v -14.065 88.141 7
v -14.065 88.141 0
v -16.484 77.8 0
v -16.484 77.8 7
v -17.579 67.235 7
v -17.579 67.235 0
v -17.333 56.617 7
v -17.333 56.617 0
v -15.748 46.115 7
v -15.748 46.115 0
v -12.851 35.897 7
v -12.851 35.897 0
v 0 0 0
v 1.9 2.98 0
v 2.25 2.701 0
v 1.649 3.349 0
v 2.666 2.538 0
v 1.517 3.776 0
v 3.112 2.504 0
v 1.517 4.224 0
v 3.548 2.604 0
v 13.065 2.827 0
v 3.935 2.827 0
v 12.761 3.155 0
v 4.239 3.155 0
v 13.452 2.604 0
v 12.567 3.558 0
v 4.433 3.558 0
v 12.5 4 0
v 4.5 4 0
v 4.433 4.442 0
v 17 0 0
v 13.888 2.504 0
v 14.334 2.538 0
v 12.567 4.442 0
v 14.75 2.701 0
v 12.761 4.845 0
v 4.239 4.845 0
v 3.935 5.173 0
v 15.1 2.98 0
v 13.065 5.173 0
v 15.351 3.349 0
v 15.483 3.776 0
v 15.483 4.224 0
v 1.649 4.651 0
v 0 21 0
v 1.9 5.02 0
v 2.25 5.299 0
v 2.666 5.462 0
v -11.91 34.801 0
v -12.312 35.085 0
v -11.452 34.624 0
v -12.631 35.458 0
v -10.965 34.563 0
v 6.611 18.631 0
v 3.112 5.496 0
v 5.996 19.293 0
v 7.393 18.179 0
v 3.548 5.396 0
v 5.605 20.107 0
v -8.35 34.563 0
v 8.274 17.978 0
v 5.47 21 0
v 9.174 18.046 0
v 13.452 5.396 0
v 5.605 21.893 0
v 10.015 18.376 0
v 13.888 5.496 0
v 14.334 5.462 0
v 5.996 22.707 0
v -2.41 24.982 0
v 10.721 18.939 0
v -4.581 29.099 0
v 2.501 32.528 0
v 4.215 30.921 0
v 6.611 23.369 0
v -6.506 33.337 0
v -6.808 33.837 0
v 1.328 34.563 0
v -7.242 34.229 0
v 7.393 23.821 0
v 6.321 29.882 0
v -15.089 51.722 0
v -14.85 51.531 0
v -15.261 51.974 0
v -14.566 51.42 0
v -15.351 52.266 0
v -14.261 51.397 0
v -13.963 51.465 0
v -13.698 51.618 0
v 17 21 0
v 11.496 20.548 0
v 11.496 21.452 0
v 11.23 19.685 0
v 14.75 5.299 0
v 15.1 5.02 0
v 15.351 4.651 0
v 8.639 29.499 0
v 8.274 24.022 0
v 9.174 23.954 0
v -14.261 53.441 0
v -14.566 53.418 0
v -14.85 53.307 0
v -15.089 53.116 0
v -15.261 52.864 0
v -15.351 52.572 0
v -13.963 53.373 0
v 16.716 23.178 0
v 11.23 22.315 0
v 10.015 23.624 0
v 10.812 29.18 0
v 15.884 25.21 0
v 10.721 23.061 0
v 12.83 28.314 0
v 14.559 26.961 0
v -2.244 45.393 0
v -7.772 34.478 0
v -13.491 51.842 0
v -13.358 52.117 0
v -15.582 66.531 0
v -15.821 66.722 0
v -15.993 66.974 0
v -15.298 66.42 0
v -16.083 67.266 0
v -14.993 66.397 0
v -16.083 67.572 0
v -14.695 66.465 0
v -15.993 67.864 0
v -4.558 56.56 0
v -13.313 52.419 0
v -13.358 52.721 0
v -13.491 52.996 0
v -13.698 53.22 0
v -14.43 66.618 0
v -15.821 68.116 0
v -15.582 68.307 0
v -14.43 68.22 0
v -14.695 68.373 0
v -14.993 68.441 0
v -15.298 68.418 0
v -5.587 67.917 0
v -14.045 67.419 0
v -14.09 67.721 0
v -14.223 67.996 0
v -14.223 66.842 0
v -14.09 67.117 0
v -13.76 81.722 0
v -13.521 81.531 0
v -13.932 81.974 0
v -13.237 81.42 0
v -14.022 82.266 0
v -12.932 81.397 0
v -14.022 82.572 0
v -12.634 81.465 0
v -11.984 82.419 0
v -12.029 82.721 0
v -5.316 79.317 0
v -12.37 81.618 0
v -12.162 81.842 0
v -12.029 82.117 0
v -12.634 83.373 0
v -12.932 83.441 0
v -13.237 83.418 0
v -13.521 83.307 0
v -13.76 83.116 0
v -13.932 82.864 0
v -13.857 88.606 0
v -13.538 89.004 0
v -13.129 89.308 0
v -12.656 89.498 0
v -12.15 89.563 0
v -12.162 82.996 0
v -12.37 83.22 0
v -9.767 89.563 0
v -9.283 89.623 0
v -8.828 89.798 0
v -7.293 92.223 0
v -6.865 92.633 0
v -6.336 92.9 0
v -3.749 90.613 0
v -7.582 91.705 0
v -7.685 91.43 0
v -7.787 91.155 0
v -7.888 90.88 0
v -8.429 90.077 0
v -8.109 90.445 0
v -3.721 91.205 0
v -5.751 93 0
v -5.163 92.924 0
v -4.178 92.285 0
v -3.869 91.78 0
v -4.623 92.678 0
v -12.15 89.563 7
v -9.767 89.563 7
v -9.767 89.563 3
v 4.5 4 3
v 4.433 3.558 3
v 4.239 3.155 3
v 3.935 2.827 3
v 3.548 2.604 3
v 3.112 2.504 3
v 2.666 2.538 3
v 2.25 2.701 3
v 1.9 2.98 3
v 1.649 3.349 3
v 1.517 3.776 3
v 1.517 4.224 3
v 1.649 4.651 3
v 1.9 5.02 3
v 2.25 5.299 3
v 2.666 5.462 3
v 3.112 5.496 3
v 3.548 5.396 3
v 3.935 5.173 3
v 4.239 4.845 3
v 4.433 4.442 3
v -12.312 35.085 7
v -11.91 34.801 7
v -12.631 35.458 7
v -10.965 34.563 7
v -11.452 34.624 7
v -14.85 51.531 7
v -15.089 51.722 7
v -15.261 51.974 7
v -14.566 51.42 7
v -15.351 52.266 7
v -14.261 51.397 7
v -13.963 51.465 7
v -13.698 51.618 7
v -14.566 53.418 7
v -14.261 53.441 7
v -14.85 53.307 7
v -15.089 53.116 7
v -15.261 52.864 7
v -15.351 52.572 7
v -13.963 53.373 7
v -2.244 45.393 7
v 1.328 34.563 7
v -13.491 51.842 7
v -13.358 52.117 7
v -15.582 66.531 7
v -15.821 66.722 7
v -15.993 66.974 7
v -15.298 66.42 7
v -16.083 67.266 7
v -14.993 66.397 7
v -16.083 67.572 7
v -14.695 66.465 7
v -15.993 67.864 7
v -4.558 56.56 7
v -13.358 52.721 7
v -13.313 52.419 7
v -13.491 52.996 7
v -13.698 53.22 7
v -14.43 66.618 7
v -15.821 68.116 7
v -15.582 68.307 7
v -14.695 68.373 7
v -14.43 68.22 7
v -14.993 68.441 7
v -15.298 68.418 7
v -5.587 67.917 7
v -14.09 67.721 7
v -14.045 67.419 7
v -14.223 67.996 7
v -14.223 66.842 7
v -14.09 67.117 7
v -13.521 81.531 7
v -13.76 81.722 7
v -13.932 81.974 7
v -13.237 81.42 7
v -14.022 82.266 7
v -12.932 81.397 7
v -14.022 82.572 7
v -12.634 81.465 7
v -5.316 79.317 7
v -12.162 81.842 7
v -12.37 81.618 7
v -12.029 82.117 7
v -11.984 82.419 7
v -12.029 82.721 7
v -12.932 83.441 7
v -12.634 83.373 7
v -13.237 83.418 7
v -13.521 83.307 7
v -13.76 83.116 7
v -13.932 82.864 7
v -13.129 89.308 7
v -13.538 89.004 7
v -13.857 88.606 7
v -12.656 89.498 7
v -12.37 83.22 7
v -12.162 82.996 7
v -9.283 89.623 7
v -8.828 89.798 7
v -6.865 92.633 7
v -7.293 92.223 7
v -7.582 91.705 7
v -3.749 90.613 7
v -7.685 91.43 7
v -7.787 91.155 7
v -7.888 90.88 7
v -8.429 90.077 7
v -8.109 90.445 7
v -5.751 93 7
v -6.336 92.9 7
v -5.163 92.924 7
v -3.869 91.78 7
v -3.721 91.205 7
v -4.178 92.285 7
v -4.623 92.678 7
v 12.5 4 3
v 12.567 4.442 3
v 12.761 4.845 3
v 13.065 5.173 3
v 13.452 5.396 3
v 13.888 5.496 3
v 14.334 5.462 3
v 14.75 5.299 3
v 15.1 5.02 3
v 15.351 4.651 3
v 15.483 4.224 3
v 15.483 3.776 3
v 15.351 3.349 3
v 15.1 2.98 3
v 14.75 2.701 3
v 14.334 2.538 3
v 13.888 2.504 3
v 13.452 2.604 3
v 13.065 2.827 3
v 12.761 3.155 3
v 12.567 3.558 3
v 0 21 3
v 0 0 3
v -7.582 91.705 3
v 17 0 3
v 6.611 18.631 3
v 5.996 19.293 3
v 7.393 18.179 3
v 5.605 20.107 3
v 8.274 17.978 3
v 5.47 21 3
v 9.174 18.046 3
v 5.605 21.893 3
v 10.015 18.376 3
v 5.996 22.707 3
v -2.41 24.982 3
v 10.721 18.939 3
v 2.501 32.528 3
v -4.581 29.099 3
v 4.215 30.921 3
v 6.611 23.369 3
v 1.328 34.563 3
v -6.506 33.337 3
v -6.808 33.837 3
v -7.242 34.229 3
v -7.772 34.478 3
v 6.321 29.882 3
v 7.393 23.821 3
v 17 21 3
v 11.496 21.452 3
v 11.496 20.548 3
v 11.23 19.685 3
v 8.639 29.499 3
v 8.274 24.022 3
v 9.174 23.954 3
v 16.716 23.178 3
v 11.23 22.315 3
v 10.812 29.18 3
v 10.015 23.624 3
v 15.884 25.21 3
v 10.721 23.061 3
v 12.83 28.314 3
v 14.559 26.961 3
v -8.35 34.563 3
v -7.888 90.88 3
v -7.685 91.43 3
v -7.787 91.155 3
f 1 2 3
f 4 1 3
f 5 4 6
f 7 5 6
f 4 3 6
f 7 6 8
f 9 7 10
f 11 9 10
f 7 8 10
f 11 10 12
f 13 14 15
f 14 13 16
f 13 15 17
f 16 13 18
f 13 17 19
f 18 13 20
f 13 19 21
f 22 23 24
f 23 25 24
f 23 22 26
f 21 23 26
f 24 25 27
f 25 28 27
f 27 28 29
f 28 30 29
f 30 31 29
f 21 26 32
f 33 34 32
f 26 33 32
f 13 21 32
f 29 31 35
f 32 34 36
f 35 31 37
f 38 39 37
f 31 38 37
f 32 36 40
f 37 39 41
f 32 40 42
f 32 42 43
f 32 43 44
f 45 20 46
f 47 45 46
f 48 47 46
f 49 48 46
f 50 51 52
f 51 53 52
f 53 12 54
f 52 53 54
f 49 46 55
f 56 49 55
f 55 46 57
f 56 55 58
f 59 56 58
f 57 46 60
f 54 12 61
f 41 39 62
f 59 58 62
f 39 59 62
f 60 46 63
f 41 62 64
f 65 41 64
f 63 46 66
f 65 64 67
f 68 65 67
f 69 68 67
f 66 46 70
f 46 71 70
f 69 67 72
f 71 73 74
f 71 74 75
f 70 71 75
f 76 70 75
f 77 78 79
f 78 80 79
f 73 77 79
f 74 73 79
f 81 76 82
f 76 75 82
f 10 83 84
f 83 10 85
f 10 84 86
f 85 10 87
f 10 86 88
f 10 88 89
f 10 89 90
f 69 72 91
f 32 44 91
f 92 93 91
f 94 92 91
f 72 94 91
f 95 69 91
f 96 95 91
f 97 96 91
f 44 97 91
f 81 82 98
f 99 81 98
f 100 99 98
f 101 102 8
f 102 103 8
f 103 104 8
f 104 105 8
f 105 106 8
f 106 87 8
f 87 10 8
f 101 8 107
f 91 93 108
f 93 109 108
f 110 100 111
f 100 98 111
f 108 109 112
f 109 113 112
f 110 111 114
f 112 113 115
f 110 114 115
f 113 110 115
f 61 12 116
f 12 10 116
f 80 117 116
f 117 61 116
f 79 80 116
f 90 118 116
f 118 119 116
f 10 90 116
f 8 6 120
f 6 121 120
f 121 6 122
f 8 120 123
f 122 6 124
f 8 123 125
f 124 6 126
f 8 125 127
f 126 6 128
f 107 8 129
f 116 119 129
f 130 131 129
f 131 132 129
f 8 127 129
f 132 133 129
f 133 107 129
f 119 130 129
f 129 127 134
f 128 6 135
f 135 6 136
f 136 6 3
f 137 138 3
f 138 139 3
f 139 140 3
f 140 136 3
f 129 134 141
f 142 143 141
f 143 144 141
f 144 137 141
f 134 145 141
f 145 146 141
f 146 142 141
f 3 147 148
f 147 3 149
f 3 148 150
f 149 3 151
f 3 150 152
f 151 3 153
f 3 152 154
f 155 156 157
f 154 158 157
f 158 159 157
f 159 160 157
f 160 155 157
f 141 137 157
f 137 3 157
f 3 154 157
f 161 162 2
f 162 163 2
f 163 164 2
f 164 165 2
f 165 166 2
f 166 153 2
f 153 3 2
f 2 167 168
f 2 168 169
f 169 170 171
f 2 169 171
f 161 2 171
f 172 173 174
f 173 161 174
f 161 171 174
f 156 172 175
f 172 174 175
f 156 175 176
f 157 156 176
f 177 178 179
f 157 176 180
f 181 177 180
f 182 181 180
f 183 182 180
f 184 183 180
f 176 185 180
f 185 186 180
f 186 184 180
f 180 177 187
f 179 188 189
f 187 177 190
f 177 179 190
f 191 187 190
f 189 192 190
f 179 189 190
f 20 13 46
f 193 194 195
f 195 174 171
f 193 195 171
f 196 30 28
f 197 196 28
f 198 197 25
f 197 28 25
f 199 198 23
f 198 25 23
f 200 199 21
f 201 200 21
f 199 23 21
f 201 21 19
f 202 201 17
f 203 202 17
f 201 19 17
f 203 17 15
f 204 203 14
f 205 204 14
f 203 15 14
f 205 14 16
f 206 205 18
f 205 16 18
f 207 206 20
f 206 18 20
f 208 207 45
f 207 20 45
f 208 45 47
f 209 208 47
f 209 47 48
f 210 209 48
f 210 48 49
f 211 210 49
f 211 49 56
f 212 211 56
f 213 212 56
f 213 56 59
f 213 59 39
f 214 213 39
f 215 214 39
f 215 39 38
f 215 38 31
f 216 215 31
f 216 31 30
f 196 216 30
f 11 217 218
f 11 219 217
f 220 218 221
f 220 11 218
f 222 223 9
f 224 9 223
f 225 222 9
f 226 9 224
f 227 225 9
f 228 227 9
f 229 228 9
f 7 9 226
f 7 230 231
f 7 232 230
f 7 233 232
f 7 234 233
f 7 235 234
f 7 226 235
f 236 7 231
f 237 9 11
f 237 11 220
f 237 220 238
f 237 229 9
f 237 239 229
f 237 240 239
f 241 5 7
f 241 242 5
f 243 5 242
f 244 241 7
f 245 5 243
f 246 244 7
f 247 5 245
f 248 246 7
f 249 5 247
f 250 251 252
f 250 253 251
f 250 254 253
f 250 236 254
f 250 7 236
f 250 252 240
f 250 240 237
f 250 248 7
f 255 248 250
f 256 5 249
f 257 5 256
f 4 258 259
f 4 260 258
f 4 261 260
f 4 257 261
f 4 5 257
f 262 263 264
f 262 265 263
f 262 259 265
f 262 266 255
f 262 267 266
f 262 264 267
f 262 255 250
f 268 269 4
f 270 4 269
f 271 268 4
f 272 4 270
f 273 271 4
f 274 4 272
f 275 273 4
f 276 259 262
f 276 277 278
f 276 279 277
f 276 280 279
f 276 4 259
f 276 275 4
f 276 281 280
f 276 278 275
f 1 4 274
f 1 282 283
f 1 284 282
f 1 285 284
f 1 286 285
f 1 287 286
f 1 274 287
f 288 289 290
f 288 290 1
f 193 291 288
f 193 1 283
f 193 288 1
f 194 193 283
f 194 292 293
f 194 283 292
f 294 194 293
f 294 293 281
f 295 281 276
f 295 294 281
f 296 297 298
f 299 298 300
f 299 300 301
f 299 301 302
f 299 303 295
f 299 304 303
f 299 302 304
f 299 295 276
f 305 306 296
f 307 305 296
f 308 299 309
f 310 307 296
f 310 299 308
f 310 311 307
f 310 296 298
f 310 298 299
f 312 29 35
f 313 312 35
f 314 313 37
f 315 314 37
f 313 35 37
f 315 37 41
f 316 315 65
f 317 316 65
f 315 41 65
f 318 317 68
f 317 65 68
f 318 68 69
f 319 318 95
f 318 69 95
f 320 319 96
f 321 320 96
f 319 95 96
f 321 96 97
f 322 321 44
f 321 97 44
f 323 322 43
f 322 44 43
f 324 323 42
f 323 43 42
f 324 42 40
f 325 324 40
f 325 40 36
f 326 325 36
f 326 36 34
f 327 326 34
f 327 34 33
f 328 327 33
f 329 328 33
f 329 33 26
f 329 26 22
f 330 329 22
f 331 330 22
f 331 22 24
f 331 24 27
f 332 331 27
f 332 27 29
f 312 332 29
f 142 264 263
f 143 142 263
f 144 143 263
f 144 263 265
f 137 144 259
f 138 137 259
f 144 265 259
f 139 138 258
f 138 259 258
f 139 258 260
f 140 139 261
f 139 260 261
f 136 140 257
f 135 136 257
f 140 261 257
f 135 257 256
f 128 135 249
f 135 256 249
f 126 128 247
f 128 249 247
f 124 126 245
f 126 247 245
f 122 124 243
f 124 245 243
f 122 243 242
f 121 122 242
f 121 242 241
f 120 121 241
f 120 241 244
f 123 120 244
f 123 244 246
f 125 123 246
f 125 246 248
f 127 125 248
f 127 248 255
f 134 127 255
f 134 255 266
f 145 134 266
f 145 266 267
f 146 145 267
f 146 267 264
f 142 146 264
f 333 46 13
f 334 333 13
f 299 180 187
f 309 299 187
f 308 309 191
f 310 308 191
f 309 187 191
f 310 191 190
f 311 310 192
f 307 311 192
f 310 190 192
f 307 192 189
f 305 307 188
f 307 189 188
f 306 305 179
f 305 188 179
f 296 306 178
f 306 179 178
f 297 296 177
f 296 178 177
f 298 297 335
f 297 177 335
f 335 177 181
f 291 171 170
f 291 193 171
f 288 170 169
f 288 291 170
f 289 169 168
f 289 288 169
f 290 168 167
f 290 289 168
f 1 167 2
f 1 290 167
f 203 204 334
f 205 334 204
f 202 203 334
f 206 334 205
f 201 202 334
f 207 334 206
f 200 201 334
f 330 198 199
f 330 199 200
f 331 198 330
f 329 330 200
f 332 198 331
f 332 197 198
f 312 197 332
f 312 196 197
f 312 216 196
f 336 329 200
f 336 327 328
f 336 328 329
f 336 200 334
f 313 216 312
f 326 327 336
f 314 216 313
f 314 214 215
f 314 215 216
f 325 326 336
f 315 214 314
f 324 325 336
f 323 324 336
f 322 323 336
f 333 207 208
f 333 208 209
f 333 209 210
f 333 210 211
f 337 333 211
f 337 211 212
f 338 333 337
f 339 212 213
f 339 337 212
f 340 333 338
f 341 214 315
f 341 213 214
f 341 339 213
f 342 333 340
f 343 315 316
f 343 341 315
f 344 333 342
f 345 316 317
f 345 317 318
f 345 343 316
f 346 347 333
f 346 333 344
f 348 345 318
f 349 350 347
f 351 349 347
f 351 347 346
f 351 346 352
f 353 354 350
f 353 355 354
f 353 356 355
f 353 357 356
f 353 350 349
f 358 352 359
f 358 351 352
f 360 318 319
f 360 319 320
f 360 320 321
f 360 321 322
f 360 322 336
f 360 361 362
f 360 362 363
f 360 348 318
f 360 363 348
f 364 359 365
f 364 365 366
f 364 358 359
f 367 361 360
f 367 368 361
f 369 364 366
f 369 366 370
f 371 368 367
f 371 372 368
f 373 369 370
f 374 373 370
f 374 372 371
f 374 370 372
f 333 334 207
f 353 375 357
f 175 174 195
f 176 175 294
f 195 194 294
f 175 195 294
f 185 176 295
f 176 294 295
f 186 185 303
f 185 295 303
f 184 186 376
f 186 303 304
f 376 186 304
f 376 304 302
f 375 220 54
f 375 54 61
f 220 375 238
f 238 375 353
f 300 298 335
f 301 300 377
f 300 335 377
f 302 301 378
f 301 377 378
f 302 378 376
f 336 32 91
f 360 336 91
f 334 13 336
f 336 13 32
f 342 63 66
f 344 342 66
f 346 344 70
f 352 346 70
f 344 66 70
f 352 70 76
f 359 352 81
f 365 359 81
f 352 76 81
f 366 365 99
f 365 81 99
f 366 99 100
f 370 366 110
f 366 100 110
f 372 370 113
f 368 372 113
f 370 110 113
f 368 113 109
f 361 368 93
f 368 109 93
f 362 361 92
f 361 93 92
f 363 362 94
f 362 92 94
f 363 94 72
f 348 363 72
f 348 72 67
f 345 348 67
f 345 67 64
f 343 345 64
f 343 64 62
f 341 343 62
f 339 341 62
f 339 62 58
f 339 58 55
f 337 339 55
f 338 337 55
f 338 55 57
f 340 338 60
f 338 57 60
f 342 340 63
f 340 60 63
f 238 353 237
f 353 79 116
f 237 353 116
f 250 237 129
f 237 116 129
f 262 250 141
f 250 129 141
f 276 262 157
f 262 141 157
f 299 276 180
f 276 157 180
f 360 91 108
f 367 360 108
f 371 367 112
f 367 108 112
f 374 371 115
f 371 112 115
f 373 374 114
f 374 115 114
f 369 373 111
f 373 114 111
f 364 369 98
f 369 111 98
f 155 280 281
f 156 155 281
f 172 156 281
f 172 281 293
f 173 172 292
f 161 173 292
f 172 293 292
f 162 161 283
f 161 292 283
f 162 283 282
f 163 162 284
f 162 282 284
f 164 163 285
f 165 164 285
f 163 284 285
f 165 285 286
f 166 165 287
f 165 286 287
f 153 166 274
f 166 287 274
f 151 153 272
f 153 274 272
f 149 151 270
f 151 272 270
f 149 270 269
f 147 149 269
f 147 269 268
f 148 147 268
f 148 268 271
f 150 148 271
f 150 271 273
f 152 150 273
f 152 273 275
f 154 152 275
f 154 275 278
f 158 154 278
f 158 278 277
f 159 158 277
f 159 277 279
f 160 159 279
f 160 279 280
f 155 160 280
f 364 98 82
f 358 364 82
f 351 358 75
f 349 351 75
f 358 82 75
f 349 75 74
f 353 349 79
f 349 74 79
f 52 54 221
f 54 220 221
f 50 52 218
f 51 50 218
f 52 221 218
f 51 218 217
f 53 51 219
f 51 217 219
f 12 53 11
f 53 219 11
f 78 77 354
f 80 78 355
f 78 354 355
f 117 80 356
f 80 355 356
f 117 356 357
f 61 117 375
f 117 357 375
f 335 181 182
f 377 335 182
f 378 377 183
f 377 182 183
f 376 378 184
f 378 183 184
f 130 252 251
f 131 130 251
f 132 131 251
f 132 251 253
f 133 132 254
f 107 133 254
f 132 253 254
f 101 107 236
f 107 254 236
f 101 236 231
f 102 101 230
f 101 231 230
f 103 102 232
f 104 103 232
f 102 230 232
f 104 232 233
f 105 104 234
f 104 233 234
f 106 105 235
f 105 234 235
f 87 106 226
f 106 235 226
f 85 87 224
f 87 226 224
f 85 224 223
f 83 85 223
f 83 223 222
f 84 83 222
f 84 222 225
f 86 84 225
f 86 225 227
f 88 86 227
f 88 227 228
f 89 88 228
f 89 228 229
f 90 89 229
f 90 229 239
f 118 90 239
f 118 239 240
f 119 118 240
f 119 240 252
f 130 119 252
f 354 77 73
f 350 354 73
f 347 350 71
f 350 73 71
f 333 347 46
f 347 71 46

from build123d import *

# Parameters (mm, degrees)
SKETCH_1_R           = 3.5
EXTRUDE_1_DEPTH      = 3
SKETCH_2_R           = 1.5
CUT_EXTRUDE_1_DEPTH  = 10
EXTRUDE_2_DEPTH      = 4
EXTRUDE_5_DEPTH      = 7
FILLET_1_R           = 2
HOLE_WIZARD_M2_5_1_D = 2.05
SKETCH_12_R          = 4.953561737
SKETCH_12_R_2        = 3.03
EXTRUDE_6_DEPTH      = 3


with BuildPart() as part:
    # 草图1 → 凸台-拉伸1 (new body)
    with BuildSketch(Plane.XY):
        with BuildLine():
            Line((0, 0), (17, 0))
            Line((17, 0), (17, 21))
            ThreePointArc((17, 21), (14.559389791, 26.961023013), (8.639106973, 29.498861644))
            ThreePointArc((8.639106973, 29.498861644), (4.214678609, 30.921411086), (1.327625741, 34.563407653))
            ThreePointArc((1.327625741, 34.563407653), (-5.234705957, 62.223549547), (-3.748501306, 90.612611571))
            ThreePointArc((-3.748501306, 90.612611571), (-5.162788524, 92.923505905), (-7.58241645, 91.704554856))
            ThreePointArc((-7.58241645, 91.704554856), (-12.196269834, 55.45091149), (0, 21))
            Line((0, 21), (0, 0))
        make_face()
        with Locations((8.5, 21)):
            Circle(SKETCH_1_R, mode=Mode.SUBTRACT)
    extrude(amount=EXTRUDE_1_DEPTH)

    # 草图2 → 切除-拉伸1 (cut)
    with BuildSketch(Plane(origin=(0, 0, 0), x_dir=(-1, 0, 0), z_dir=(0, 0, -1))):
        with Locations((-14, 4)):
            Circle(SKETCH_2_R)
        with Locations(Location((-3, 4, 0), (0, 0, 180))):
            Circle(SKETCH_2_R)
    extrude(amount=-CUT_EXTRUDE_1_DEPTH, mode=Mode.SUBTRACT)

    # 草图3 → 凸台-拉伸2 (add)
    with BuildSketch(Plane.XY.offset(3)):
        with BuildLine():
            ThreePointArc((-7.58241645, 91.704554856), (-12.6426678, 63.080202535), (-7.007767698, 34.563407653))
            Line((-7.007767698, 34.563407653), (1.327625741, 34.563407653))
            ThreePointArc((1.327625741, 34.563407653), (-5.234705957, 62.223549547), (-3.748501306, 90.612611571))
            ThreePointArc((-3.748501306, 90.612611571), (-5.162788524, 92.923505905), (-7.58241645, 91.704554856))
        make_face()
    extrude(amount=EXTRUDE_2_DEPTH)

    # 草图8 → 凸台-拉伸5 (add)
    with BuildSketch(Plane(origin=(0, 0, 0), x_dir=(-1, 0, 0), z_dir=(0, 0, -1))):
        with BuildLine():
            Line((8.353336216, 89.563407653), (13.622203114, 89.563407653))
            ThreePointArc((13.622203114, 89.563407653), (17.624786926, 61.957713987), (12.366747323, 34.563407653))
            Line((12.366747323, 34.563407653), (7.007767698, 34.563407653))
            ThreePointArc((7.007767698, 34.563407653), (12.623031035, 61.942490485), (8.353336216, 89.563407653))
        make_face()
    extrude(amount=-EXTRUDE_5_DEPTH)

    # 圆角1
    fillet_1_edges = [part.edges().sort_by_distance(p)[0] for p in [
        (-12.366747323, 34.563407653, 3.5),
        (-13.622203114, 89.563407653, 3.5),
        (-8.353336216, 89.563407653, 3.5),
        (-7.007767698, 34.563407653, 1.5),
    ]]
    fillet(fillet_1_edges, radius=FILLET_1_R)

    # M2.5 螺纹孔1 (through all)
    with Locations(Plane(origin=(0, 0, 0), x_dir=(-1, 0, 0), z_dir=(0, 0, -1))):
        with Locations((14.33753876, 52.418963936), (-20.3596947, 65.689324708), (13.008857265, 82.418963936), (15.069556912, 67.418963936)):
            Hole(HOLE_WIZARD_M2_5_1_D / 2)

    # 草图12 → 凸台-拉伸6 (add)
    with BuildSketch(Plane(origin=(0, 0, 0), x_dir=(-1, 0, 0), z_dir=(0, 0, -1))):
        with Locations((-8.5, 21)):
            Circle(SKETCH_12_R)
        with Locations((-8.5, 21)):
            Circle(SKETCH_12_R_2, mode=Mode.SUBTRACT)
    extrude(amount=-EXTRUDE_6_DEPTH)


solid = part.part
